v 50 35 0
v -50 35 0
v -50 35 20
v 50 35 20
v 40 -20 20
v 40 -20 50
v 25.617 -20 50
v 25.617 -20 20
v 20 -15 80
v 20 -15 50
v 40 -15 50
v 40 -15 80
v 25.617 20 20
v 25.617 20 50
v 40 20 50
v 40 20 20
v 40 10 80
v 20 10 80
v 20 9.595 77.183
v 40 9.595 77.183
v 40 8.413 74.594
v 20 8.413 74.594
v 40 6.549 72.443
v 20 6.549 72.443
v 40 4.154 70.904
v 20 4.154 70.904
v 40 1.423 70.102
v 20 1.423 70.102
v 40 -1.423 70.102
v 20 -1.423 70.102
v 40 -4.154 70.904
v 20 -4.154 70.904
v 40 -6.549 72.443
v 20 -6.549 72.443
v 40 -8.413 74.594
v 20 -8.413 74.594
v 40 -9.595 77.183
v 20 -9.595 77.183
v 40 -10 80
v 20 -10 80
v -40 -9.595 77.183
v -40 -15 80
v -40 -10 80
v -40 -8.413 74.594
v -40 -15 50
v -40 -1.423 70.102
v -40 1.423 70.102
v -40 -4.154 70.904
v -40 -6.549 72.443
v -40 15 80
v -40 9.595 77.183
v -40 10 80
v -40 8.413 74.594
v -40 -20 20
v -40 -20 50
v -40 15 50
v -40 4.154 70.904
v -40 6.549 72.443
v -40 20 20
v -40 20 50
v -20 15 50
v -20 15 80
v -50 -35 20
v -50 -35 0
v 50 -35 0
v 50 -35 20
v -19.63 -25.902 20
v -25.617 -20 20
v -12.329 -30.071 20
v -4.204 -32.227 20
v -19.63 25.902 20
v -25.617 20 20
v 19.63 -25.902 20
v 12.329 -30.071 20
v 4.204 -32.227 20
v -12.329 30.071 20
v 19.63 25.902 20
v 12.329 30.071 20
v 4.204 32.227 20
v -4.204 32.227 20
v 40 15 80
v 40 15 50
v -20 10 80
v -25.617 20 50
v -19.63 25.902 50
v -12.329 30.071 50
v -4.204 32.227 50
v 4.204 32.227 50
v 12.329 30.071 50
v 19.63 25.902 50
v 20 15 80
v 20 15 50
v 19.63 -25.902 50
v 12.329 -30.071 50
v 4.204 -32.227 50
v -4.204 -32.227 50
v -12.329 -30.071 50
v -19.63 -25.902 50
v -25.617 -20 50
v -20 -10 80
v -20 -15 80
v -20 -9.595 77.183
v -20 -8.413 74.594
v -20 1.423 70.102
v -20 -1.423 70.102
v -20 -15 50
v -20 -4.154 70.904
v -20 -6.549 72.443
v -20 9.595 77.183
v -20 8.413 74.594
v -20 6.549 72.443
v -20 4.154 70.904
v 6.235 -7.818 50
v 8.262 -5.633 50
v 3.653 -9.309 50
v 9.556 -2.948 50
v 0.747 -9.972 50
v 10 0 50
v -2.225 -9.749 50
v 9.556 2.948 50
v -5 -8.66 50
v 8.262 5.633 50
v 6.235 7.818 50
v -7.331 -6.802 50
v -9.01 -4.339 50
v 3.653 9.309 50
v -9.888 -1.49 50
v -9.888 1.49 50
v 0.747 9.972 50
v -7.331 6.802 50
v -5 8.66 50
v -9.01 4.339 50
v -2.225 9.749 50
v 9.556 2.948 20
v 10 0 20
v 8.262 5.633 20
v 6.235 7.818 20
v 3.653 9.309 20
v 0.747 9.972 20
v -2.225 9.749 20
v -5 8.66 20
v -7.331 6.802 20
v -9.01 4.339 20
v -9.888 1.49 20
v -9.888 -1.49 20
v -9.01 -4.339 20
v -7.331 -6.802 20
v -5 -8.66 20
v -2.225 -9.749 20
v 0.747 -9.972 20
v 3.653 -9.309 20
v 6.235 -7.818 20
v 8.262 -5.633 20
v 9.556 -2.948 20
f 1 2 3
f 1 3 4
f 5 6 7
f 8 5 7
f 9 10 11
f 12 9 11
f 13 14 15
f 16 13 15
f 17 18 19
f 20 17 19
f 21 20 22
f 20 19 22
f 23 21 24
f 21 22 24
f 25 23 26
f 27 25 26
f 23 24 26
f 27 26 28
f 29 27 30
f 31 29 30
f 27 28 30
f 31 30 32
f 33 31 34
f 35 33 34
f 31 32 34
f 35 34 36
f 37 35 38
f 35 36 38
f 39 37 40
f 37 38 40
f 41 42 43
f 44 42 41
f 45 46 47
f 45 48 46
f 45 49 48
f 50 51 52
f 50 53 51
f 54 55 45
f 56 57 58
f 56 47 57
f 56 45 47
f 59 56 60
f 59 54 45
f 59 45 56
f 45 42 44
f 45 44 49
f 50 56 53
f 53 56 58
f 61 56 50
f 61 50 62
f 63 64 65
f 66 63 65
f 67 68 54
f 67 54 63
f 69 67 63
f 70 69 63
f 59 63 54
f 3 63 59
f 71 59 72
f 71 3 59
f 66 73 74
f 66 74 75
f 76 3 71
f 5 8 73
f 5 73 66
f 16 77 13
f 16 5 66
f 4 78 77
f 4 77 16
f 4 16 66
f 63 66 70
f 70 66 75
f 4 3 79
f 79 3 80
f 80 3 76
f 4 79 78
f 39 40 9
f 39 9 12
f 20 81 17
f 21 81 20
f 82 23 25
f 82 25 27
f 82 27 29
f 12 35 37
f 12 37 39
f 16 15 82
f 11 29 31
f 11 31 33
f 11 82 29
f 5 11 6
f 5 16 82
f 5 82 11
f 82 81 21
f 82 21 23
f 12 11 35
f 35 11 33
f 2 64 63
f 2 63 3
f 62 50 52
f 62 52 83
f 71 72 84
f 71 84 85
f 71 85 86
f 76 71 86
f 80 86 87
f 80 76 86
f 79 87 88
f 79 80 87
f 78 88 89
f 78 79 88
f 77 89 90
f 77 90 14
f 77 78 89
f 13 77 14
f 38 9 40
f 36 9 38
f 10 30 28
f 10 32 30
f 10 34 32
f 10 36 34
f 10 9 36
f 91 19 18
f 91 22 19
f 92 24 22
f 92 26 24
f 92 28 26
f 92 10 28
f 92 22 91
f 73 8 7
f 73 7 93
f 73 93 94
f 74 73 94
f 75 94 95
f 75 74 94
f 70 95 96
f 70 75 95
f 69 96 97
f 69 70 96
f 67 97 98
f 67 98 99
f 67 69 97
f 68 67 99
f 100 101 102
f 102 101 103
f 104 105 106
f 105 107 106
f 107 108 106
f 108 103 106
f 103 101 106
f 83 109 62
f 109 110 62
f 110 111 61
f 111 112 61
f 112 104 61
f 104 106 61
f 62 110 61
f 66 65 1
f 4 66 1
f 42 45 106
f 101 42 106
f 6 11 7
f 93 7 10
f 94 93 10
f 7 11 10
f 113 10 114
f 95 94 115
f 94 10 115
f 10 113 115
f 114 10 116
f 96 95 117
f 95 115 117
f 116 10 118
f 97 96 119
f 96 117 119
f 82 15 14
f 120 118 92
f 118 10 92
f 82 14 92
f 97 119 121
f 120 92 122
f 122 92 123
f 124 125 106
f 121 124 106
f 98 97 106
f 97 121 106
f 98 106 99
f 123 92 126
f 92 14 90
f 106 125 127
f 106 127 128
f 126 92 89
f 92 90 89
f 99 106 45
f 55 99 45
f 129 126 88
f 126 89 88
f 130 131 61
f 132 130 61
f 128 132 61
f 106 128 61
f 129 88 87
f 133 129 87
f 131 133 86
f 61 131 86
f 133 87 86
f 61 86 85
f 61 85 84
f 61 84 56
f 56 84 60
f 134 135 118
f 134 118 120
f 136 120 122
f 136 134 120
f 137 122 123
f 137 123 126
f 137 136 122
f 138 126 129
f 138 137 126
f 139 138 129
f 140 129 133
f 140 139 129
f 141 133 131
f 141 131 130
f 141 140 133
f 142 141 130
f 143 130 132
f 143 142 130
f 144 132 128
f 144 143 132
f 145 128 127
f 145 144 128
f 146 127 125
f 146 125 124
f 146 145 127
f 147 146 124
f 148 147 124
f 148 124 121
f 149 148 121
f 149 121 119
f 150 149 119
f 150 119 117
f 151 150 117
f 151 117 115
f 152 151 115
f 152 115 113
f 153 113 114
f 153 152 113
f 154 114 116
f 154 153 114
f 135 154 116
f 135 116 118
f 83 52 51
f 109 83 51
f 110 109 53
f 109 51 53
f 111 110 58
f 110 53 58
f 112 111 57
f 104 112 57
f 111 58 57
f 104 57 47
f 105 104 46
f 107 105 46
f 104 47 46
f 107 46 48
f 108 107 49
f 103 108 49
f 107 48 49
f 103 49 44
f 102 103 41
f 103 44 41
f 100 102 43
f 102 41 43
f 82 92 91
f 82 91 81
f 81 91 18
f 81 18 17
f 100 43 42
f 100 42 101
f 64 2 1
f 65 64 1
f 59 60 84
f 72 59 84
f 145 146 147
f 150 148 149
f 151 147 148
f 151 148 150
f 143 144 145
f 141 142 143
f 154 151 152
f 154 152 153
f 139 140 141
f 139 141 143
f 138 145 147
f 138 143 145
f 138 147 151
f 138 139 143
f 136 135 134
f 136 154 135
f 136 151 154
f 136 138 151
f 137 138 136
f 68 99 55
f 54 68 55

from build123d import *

# Parameters (mm, degrees)
SKETCH_1_W          = 100
SKETCH_1_H          = 70
EXTRUDE_1_DEPTH     = 20
SKETCH_2_R          = 10
EXTRUDE_2_DEPTH     = 30
SKETCH_3_W          = 20
SKETCH_3_H          = 30
EXTRUDE_3_DEPTH     = 30
CUT_EXTRUDE_1_DEPTH = 126.39936204


with BuildPart() as part:
    # 草圖1 → 填料-伸長1 (new body)
    with BuildSketch(Plane.XY):
        Rectangle(SKETCH_1_W, SKETCH_1_H)
    extrude(amount=EXTRUDE_1_DEPTH)

    # 草圖2 → 填料-伸長2 (add)
    with BuildSketch(Plane.XY.offset(20)):
        with BuildLine():
            Line((25.617376915, 20), (40, 20))
            Line((40, 20), (40, -20))
            Line((40, -20), (25.617376915, -20))
            ThreePointArc((25.617376915, -20), (0, -32.5), (-25.617376915, -20))
            Line((-25.617376915, -20), (-40, -20))
            Line((-40, -20), (-40, 20))
            Line((-40, 20), (-25.617376915, 20))
            ThreePointArc((-25.617376915, 20), (0, 32.5), (25.617376915, 20))
        make_face()
        Circle(SKETCH_2_R, mode=Mode.SUBTRACT)
    extrude(amount=EXTRUDE_2_DEPTH)

    # 草圖3 → 填料-伸長3 (add)
    with BuildSketch(Plane.XY.offset(50)):
        with Locations((30, 0)):
            Rectangle(SKETCH_3_W, SKETCH_3_H)
        with Locations((-30, 0)):
            Rectangle(SKETCH_3_W, SKETCH_3_H)
    extrude(amount=EXTRUDE_3_DEPTH)

    # 草圖4 → 除料-伸長1 (cut, through all)
    with BuildSketch(Plane.ZY.offset(40)):
        with BuildLine():
            ThreePointArc((90, 0), (87.071067812, 7.071067812), (80, 10))
            Line((80, 10), (80, -10))
            ThreePointArc((80, -10), (87.071067812, -7.071067812), (90, 0))
        make_face()
        with BuildLine():
            Line((80, -10), (80, 10))
            ThreePointArc((80, 10), (70, 0), (80, -10))
        make_face()
    extrude(amount=-CUT_EXTRUDE_1_DEPTH, mode=Mode.SUBTRACT)


solid = part.part
